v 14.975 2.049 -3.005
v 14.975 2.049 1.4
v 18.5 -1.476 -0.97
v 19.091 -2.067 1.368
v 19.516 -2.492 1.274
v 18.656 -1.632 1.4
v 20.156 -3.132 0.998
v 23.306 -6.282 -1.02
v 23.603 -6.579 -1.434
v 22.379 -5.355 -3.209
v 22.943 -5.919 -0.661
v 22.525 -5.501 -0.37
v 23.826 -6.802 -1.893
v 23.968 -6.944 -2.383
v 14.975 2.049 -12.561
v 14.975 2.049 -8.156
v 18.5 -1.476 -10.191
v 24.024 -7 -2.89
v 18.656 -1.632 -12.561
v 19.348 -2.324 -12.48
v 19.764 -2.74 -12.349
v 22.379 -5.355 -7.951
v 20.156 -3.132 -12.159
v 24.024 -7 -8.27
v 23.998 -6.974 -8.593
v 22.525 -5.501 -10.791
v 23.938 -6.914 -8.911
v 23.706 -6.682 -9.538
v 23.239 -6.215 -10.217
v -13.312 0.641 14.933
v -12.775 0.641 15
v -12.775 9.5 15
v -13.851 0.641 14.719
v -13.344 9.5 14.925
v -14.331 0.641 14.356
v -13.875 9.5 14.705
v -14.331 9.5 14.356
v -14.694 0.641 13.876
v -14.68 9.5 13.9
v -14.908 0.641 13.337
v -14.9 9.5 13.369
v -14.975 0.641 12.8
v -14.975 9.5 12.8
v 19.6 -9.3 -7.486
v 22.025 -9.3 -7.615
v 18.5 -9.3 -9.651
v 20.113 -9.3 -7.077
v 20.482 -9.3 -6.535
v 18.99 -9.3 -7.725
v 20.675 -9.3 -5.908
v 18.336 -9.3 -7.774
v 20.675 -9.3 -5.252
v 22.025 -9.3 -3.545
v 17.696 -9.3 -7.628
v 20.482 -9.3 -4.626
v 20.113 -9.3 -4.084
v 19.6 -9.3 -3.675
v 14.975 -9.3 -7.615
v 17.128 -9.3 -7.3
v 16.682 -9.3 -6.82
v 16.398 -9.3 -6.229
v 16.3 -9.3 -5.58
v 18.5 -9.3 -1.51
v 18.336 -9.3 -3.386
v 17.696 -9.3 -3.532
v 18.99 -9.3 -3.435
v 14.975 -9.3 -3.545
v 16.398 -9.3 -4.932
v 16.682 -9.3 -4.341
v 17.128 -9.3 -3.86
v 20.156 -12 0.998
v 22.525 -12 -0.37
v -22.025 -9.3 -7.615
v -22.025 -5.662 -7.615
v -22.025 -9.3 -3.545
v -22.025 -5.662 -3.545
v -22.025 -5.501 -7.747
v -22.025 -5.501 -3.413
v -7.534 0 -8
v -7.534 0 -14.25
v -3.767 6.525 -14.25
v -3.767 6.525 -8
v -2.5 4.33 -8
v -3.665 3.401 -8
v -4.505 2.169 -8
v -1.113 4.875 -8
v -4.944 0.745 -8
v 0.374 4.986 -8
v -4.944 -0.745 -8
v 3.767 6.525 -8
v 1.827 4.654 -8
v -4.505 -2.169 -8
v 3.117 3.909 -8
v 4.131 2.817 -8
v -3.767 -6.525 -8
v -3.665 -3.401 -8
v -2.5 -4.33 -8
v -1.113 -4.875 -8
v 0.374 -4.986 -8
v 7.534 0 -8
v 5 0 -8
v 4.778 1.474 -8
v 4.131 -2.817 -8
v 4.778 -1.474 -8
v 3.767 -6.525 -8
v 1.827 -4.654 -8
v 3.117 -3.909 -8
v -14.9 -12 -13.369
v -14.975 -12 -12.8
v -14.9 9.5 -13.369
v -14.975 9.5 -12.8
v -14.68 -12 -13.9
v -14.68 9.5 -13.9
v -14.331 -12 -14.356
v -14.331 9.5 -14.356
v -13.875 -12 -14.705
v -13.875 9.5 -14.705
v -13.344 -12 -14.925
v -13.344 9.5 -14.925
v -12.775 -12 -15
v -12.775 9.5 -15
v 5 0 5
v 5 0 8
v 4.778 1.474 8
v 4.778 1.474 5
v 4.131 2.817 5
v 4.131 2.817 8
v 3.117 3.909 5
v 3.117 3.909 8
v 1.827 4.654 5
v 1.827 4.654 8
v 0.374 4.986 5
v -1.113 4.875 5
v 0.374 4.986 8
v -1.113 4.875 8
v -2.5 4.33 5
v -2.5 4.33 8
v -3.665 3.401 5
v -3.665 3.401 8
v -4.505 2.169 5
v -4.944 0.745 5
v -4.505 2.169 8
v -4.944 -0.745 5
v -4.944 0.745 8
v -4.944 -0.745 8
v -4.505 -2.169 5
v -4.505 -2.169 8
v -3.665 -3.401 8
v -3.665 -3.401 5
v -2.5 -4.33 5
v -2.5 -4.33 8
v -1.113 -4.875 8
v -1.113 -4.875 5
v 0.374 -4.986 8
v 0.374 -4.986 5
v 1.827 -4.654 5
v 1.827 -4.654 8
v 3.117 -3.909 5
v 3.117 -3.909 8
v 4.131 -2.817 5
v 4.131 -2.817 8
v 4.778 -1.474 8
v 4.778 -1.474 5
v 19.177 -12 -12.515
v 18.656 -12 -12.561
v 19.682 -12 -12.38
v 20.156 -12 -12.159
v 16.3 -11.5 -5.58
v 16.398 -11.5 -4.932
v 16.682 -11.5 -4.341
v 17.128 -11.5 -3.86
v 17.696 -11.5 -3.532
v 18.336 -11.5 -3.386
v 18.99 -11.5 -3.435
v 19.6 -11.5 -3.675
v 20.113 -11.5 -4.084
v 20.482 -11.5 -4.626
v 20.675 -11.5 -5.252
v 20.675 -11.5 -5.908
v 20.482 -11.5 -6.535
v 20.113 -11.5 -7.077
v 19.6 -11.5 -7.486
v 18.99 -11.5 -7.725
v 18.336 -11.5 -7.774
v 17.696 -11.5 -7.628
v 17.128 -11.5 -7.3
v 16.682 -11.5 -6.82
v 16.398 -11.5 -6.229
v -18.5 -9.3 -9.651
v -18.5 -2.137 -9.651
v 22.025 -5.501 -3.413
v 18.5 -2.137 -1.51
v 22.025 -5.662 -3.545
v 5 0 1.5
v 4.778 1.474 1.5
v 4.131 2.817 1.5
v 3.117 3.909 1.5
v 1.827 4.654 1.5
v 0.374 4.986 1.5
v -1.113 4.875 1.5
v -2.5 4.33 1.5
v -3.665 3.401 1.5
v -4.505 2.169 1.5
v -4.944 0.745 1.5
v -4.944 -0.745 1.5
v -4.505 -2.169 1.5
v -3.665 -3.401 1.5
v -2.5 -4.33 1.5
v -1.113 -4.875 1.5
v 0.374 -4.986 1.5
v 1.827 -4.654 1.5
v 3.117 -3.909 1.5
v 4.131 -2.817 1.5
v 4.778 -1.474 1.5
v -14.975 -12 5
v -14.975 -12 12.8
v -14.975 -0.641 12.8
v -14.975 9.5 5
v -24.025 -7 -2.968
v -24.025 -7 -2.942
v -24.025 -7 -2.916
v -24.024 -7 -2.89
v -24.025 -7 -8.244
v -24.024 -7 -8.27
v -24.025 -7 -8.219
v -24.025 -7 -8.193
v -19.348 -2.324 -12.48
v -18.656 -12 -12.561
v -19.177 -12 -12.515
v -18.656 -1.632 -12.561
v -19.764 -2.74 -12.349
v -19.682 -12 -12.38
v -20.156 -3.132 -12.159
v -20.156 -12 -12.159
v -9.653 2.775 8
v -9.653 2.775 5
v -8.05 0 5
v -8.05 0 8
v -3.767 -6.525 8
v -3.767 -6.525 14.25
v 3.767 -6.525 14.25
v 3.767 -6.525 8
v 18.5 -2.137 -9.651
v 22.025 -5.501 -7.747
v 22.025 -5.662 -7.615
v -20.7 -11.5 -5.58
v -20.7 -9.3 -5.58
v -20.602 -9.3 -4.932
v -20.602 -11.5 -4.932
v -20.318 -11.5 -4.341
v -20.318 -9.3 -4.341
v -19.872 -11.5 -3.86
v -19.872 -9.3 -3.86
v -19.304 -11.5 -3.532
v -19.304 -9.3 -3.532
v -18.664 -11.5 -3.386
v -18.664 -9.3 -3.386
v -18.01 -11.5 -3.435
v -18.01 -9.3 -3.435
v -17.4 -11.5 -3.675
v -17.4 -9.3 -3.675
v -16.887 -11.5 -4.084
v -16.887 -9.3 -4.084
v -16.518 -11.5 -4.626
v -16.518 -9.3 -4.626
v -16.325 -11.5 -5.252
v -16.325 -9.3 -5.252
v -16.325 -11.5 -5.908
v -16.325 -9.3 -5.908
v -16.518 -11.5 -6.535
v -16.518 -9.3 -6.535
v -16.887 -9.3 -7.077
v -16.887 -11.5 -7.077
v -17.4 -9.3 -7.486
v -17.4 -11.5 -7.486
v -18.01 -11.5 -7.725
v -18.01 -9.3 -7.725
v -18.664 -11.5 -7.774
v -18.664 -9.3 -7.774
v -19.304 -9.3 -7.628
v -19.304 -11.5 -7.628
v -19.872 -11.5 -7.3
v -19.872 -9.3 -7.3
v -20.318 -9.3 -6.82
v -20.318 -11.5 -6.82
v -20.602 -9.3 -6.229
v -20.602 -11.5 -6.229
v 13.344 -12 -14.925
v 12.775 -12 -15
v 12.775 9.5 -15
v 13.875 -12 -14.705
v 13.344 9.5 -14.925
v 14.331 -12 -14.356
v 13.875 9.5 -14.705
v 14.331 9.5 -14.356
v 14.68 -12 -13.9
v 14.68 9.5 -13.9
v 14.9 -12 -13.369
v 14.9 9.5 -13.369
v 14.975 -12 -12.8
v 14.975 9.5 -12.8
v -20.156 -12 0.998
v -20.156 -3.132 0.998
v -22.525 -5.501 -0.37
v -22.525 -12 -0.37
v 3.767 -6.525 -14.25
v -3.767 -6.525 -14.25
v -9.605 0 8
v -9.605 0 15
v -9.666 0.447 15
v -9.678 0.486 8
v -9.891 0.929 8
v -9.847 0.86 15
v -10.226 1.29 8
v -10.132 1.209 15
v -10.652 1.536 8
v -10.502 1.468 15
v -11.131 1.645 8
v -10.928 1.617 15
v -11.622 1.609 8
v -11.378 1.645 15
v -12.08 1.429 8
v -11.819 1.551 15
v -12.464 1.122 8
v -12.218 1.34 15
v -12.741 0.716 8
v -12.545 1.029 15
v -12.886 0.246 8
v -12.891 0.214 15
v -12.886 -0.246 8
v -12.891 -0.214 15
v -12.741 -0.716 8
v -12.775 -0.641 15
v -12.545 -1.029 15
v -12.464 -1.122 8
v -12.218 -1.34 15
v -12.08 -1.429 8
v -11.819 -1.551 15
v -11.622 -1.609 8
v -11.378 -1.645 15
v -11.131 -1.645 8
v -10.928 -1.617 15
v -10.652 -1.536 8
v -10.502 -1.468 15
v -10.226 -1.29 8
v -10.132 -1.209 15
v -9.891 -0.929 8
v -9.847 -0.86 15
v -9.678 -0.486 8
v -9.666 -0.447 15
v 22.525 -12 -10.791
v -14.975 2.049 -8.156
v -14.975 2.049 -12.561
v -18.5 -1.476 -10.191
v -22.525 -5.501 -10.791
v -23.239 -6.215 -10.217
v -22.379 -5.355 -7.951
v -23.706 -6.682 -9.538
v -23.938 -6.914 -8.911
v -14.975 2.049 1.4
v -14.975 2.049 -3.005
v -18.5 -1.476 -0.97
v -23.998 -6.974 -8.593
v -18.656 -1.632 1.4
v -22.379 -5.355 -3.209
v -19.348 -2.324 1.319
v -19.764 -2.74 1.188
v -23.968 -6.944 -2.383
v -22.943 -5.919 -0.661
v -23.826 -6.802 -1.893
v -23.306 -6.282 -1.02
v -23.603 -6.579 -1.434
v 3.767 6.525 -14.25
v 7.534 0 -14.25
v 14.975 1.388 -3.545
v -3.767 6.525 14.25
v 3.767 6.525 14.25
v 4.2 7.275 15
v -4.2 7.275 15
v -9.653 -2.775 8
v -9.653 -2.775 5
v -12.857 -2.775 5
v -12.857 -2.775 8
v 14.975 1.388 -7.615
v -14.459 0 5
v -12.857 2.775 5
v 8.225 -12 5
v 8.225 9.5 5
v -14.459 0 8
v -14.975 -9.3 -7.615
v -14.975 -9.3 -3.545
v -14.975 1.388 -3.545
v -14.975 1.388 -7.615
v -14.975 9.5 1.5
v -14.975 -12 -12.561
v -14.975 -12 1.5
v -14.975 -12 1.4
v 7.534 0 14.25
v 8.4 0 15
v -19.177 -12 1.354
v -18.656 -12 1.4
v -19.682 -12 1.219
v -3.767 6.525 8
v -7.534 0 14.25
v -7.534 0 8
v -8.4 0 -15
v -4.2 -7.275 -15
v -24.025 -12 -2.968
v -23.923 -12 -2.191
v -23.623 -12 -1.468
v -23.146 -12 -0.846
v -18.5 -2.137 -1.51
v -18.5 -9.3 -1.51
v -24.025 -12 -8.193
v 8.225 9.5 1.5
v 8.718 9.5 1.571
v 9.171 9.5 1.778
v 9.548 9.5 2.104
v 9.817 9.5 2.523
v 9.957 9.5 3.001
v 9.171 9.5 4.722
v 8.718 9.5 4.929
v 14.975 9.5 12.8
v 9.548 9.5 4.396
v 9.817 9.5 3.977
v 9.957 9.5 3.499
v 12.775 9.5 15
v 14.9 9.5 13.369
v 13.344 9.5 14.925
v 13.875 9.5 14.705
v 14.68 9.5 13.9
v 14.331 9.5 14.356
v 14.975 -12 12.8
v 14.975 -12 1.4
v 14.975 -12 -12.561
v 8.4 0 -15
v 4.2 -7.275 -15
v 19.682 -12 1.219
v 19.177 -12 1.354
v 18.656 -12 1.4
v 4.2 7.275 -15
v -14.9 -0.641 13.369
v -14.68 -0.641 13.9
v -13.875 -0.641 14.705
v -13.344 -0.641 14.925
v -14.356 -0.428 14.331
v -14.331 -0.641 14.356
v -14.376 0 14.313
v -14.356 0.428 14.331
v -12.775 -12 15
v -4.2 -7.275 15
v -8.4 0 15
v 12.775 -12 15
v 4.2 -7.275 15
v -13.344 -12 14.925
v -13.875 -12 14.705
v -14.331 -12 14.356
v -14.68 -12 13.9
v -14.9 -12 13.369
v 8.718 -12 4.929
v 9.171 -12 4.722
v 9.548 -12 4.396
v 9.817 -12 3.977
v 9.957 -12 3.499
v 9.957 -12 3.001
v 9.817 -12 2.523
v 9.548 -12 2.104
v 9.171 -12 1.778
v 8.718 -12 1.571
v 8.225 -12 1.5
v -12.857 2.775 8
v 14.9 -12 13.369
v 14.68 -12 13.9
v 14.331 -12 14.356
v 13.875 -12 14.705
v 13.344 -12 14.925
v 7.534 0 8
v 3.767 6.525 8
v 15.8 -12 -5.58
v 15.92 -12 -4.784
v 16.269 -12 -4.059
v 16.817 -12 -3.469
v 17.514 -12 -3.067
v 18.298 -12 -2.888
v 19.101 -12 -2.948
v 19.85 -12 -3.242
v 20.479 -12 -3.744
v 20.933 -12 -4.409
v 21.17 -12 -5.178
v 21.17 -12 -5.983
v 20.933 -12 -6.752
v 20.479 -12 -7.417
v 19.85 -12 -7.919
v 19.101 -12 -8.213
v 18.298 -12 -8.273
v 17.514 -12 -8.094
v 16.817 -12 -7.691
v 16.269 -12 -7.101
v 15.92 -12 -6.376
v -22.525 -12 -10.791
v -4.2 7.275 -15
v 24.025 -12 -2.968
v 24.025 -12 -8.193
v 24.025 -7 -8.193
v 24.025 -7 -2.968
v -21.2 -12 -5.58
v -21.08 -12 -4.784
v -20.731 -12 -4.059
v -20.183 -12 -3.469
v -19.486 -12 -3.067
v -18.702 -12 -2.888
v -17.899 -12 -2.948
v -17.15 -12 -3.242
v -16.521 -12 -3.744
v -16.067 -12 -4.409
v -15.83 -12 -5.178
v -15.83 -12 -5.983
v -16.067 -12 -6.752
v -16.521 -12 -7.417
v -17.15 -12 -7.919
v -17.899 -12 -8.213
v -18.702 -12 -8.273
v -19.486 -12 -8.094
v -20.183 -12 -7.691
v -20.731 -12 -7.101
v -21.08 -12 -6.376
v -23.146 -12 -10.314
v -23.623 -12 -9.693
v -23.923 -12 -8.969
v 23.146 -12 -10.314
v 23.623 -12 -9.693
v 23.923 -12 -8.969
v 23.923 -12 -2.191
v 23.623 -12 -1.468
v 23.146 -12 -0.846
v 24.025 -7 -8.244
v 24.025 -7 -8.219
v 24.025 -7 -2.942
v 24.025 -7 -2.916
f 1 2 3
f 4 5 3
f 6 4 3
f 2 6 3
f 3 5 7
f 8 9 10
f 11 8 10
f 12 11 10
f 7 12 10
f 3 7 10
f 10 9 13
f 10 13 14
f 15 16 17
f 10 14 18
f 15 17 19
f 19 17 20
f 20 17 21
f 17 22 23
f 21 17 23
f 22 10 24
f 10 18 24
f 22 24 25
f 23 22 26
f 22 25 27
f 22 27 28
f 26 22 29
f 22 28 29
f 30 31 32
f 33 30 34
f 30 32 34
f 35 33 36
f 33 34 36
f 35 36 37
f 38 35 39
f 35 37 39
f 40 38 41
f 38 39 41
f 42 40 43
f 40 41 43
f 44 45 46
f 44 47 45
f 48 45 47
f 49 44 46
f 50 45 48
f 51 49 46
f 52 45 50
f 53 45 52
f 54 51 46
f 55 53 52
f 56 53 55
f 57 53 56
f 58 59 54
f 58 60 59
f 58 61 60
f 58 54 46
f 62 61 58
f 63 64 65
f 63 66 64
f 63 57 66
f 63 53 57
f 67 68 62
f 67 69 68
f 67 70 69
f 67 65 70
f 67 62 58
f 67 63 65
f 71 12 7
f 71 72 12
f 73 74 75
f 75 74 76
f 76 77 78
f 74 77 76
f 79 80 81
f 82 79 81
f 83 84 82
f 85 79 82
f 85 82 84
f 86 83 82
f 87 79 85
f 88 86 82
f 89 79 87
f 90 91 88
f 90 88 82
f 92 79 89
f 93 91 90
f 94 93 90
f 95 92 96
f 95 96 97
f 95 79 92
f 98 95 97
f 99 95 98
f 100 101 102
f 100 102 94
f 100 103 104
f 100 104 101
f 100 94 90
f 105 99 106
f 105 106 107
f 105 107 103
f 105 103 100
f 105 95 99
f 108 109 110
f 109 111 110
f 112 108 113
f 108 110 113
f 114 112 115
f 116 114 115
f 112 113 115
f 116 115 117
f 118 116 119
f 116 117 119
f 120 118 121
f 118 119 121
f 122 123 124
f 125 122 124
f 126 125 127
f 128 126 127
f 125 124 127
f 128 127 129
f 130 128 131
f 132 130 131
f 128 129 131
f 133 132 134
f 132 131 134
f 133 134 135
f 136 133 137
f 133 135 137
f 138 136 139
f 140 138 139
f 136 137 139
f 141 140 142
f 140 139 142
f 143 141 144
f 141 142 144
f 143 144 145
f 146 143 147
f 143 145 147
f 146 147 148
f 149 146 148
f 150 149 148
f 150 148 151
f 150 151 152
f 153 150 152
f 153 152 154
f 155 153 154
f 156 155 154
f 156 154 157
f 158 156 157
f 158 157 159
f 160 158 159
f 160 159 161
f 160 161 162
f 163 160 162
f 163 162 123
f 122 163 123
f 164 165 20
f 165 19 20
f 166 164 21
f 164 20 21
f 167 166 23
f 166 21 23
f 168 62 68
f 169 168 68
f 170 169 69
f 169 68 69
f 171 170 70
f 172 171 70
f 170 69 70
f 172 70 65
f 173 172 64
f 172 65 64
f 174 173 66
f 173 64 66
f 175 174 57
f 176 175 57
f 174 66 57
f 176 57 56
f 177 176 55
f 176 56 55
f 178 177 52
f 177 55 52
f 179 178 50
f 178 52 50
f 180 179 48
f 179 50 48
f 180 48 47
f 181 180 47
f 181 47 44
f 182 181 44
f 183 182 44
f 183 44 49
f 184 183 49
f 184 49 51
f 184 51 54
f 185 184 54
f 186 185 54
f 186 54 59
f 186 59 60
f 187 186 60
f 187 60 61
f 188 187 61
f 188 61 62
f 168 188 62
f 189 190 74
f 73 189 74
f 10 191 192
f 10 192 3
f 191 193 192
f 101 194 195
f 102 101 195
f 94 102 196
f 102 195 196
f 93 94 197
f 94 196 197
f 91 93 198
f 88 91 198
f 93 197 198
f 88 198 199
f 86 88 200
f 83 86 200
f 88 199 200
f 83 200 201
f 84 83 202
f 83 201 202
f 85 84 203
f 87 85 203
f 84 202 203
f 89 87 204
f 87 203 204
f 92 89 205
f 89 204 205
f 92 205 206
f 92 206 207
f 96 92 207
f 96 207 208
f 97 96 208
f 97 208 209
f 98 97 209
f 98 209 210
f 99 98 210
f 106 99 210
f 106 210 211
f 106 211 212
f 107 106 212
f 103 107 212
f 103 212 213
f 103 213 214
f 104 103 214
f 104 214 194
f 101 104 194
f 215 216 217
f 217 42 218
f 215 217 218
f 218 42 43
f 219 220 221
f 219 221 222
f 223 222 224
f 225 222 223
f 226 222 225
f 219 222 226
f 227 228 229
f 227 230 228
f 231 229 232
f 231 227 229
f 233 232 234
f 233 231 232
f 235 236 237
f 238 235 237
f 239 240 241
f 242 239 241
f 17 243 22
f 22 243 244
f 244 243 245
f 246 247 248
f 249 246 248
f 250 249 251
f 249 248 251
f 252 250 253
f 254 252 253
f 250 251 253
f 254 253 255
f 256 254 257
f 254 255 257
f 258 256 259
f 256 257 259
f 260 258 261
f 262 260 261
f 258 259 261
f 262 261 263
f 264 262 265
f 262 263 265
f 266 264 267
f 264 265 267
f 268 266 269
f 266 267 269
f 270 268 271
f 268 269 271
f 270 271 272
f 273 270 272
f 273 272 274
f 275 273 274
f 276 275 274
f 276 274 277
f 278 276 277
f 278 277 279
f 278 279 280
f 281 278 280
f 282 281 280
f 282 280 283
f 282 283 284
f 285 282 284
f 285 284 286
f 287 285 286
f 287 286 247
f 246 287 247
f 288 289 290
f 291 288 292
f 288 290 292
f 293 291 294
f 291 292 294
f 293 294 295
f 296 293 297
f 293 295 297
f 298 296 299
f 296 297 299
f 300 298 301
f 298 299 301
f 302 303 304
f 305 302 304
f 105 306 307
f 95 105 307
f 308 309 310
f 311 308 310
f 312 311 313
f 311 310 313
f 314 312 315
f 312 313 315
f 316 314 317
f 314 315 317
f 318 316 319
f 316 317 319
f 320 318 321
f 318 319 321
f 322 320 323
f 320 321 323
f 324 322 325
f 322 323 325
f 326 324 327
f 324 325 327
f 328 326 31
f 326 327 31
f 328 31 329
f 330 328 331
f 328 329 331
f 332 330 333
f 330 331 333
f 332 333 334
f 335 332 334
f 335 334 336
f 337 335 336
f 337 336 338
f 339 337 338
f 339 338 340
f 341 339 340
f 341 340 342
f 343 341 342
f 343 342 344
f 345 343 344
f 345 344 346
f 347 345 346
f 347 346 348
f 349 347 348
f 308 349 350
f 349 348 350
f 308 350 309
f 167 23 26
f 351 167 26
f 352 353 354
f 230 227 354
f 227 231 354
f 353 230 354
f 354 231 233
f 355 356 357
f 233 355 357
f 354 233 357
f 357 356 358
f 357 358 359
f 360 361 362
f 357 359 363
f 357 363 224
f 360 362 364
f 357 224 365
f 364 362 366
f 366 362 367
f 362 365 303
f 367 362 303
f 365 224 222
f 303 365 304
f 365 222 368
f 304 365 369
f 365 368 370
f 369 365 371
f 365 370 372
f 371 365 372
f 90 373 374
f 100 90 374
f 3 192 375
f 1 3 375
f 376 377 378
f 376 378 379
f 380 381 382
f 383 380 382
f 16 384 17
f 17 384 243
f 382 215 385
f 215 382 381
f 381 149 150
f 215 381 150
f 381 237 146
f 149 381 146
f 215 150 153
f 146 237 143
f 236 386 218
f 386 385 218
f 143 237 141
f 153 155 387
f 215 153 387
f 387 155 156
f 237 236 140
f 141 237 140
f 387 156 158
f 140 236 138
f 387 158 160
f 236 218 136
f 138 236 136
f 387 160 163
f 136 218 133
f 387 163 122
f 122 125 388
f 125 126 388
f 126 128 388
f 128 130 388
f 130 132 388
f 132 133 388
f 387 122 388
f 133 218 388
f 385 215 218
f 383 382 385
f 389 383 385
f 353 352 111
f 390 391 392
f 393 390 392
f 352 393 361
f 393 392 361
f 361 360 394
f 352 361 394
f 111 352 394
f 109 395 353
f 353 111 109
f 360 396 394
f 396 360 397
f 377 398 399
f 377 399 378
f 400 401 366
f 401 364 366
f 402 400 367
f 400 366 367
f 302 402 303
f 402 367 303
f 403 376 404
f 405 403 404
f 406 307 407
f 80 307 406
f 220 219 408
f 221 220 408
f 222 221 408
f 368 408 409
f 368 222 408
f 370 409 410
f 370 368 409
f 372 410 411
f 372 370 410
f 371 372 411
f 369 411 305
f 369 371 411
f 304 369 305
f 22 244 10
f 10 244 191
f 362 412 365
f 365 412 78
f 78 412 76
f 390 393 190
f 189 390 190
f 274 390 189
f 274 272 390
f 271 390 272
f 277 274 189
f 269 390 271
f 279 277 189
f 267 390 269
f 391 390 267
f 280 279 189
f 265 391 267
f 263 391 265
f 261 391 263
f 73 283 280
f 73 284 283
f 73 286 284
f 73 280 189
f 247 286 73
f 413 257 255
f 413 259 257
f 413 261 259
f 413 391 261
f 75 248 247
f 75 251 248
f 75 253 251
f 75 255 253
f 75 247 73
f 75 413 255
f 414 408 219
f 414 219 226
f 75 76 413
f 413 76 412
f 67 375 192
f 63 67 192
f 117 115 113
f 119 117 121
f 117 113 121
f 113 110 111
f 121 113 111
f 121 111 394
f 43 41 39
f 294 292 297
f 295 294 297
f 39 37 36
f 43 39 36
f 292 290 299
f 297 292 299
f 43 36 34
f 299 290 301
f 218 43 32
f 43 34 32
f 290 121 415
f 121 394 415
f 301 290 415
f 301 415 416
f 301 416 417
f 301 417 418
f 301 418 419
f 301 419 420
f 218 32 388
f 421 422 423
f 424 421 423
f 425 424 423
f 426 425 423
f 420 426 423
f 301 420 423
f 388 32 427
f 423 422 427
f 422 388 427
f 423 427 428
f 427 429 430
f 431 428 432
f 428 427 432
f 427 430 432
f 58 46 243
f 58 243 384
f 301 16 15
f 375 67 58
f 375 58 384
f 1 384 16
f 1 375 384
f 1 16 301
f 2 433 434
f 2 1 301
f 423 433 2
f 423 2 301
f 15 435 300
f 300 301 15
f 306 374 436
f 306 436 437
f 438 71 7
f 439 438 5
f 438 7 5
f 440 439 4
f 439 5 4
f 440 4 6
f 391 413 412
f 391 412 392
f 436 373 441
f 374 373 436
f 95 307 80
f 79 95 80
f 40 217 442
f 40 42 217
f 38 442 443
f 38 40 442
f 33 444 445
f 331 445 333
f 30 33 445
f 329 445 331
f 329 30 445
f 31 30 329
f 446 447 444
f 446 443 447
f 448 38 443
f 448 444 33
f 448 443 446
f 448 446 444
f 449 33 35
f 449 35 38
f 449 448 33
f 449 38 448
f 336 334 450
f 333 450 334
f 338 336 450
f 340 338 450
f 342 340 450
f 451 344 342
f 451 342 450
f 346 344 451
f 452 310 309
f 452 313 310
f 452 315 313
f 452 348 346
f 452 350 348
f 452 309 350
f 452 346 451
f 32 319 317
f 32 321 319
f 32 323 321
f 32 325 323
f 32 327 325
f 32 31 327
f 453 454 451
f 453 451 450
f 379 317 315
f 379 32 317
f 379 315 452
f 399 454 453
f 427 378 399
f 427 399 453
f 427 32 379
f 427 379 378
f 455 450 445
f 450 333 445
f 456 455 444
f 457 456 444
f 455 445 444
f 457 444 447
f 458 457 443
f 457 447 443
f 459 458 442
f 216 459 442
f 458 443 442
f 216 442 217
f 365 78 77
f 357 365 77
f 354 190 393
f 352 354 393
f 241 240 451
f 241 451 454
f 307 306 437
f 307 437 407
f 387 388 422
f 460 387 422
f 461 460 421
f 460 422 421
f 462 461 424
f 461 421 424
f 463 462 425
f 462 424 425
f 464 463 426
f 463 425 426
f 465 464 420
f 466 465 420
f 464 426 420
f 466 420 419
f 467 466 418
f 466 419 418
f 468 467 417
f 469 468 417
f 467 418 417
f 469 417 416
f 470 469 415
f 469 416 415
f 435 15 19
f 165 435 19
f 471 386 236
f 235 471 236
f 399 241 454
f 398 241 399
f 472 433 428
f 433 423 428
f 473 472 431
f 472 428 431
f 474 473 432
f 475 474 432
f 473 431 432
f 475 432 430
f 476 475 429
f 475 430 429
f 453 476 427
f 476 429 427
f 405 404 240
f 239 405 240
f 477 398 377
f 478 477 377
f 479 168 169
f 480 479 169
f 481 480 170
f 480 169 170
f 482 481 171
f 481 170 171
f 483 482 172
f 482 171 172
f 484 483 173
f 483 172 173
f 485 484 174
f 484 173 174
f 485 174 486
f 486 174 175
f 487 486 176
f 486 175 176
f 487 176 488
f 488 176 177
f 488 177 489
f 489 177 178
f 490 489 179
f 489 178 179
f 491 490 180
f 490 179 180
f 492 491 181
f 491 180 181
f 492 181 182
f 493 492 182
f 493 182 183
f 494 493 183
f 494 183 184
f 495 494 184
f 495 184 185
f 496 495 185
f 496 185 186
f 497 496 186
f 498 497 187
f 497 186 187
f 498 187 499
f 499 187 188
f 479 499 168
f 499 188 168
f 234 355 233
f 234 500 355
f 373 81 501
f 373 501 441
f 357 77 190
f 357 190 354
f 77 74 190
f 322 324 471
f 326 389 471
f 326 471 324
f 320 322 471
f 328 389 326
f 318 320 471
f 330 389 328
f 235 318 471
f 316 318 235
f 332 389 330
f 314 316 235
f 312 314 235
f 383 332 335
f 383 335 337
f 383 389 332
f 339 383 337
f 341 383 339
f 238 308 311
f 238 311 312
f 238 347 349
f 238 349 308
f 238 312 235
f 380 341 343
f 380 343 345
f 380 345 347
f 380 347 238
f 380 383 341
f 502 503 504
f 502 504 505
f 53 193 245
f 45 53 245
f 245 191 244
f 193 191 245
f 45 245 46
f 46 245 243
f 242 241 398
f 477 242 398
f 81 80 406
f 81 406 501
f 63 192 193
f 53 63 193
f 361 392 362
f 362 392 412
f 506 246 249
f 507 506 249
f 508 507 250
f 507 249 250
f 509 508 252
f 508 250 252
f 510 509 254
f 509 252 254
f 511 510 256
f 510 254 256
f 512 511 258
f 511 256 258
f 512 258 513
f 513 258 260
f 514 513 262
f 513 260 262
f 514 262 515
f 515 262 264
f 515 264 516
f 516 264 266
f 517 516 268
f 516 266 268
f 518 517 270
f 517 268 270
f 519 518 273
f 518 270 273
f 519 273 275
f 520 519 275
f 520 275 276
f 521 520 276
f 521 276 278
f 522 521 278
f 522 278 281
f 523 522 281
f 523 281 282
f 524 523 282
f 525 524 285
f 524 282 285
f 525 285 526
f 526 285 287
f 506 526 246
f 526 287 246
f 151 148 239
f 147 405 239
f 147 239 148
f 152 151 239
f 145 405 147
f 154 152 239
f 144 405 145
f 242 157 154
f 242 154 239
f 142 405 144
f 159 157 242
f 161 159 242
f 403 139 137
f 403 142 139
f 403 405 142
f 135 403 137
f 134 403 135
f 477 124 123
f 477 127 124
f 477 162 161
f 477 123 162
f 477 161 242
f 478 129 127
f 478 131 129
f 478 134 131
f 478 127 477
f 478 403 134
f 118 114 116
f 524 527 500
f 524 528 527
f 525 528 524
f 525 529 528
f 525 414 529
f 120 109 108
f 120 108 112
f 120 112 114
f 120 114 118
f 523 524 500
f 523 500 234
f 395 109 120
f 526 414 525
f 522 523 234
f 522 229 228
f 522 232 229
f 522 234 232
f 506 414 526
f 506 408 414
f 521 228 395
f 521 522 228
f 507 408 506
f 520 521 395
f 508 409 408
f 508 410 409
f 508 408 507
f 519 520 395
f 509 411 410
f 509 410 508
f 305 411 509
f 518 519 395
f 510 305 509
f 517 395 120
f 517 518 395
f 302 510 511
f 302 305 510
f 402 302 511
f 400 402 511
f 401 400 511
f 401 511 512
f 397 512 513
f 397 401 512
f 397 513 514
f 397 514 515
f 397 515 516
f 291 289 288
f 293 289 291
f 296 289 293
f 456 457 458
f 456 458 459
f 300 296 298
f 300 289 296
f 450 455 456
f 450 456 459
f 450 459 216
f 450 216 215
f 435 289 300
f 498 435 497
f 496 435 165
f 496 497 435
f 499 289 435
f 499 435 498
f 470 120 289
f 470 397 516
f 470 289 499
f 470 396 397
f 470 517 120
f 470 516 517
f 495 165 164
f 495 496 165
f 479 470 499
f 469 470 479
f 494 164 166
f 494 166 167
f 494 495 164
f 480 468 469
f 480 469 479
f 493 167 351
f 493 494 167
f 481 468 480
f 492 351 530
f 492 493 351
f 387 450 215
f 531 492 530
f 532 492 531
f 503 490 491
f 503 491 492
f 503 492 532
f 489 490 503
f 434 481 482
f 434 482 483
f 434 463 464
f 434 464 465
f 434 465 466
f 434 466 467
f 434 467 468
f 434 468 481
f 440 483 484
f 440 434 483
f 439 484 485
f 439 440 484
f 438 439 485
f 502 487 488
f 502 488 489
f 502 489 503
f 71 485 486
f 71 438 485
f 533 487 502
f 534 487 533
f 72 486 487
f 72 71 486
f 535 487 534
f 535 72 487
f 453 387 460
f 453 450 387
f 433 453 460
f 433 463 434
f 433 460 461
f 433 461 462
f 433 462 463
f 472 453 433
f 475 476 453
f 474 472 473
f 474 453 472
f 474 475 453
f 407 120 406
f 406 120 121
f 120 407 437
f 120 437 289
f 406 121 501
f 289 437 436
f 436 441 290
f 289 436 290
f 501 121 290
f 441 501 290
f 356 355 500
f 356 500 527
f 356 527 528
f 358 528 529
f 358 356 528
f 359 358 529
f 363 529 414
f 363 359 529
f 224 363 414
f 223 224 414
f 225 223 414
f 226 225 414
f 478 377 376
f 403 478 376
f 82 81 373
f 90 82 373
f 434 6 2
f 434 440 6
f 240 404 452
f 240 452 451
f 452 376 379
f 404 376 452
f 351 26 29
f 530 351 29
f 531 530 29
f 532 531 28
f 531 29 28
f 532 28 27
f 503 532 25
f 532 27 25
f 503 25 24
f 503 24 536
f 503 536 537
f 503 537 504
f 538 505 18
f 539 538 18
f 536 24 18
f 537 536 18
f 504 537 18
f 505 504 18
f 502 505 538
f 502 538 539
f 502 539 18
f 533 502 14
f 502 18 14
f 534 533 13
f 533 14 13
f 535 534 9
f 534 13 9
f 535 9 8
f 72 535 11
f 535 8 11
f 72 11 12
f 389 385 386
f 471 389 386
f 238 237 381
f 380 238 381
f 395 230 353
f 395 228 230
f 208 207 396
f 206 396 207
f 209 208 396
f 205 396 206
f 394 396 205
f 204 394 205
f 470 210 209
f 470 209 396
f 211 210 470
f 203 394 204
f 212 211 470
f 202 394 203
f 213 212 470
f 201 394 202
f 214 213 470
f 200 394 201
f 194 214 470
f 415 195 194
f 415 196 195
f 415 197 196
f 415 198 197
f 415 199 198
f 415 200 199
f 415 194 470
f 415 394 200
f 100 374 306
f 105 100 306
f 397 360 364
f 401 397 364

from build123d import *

# Parameters (mm, degrees)
SKETCH_W        = 29.95
SKETCH_H        = 21.5
PAD_DEPTH       = 15
POCKET_DEPTH    = 21.501
SKETCH002_R     = 5
POCKET001_DEPTH = 30.001
POCKET002_DEPTH = 7
POCKET003_DEPTH = 7
PAD001_DEPTH    = 5
CHAMFER_SIZE    = 9.049
POCKET004_DEPTH = 18.8
SKETCH007_R     = 2.2
POCKET005_DEPTH = 2.701
SKETCH008_R     = 1.65
POCKET006_DEPTH = 10
POCKET007_DEPTH = 3
FILLET_R        = 2.2
FILLET001_R     = 3
CHAMFER001_SIZE = 0.75
CHAMFER002_SIZE = 0.5
CHAMFER003_SIZE = 0.5


with BuildPart() as part:
    # Sketch → Pad (new body, symmetric)
    with BuildSketch(Plane.XY):
        with Locations((0, -1.25)):
            Rectangle(SKETCH_W, SKETCH_H)
    extrude(amount=PAD_DEPTH, both=True)

    # Sketch001 (on Face1 of Pad) → Pocket (cut, through all)
    with BuildSketch(Plane(origin=(0, 9.5, 0), x_dir=(-1, 0, 0), z_dir=(0, 1, 0))):
        with BuildLine():
            Line((14.975, 1.5), (14.975, 5))
            Line((14.975, 5), (-8.224983, 5))
            ThreePointArc((-8.224983, 5), (-9.975, 3.25), (-8.224983, 1.5))
            Line((14.975, 1.5), (-8.224983, 1.5))
        make_face()
    extrude(amount=-POCKET_DEPTH, mode=Mode.SUBTRACT)

    # Sketch002 (on Face4 of Pocket) → Pocket001 (cut, through all)
    with BuildSketch(Plane.XY.offset(15)):
        Circle(SKETCH002_R)
    extrude(amount=-POCKET001_DEPTH, mode=Mode.SUBTRACT)

    # Sketch003 (on Face4 of Pocket001) → Pocket002 (cut)
    with BuildSketch(Plane.XY.offset(15)):
        Polygon((7.534421, 0), (3.767211, 6.525), (-3.767211, 6.525), (-7.534421, 0), (-3.767211, -6.525), (3.767211, -6.525), align=None)
    extrude(amount=-POCKET002_DEPTH, mode=Mode.SUBTRACT)

    # Sketch004 (on Face2 of Pocket002) → Pocket003 (cut)
    with BuildSketch(Plane(origin=(0, 0, -15), x_dir=(1, 0, 0), z_dir=(0, 0, -1))):
        Polygon((7.534421, 0), (3.767211, 6.525), (-3.767211, 6.525), (-7.534421, 0), (-3.767211, -6.525), (3.767211, -6.525), align=None)
    extrude(amount=-POCKET003_DEPTH, mode=Mode.SUBTRACT)

    # Sketch005 (on Face10 of Pocket003) → Pad001 (new body)
    with BuildSketch(Plane.XZ.offset(12)):
        Polygon((-14.975, 1.4), (-19.459732, 1.4), (-24.025, -1.235759), (-24.025, -9.92488), (-19.459732, -12.560639), (-14.975, -12.560639), align=None)
        Polygon((14.975, 1.4), (14.975, -12.560639), (19.459732, -12.560639), (24.025, -9.92488), (24.025, -1.235759), (19.459732, 1.4), align=None)
    extrude(amount=-PAD001_DEPTH)

    # Chamfer
    chamfer_edges = [part.edges().sort_by_distance(p)[0] for p in [
        (-14.975, -7, -5.580319),
        (14.975, -7, -5.580319),
    ]]
    chamfer(chamfer_edges, length=CHAMFER_SIZE)

    # Sketch006 (on Face7 of Chamfer) → Pocket004 (cut)
    with BuildSketch(Plane(origin=(0, 9.5, 0), x_dir=(-1, 0, 0), z_dir=(0, 1, 0))):
        Polygon((22.025, -7.61548), (22.025, -3.54516), (18.5, -1.510001), (14.975, -3.54516), (14.975, -7.61548), (18.5, -9.650639), align=None)
        Polygon((-18.5, -9.650639), (-14.975, -7.61548), (-14.975, -3.54516), (-18.5, -1.510001), (-22.025, -3.54516), (-22.025, -7.61548), align=None)
    extrude(amount=-POCKET004_DEPTH, mode=Mode.SUBTRACT)

    # Sketch007 (on Face36 of Pocket004) → Pocket005 (cut, through all)
    with BuildSketch(Plane(origin=(0, -9.3, 0), x_dir=(-1, 0, 0), z_dir=(0, 1, 0))):
        with Locations((-18.5, -5.58032)):
            Circle(SKETCH007_R)
        with Locations((18.5, -5.58032)):
            Circle(SKETCH007_R)
    extrude(amount=-POCKET005_DEPTH, mode=Mode.SUBTRACT)

    # Sketch008 (on Face23 of Pocket005) → Pocket006 (cut)
    with BuildSketch(Plane.XY.offset(15)):
        with Locations((-11.254711, 0)):
            Circle(SKETCH008_R)
    extrude(amount=-POCKET006_DEPTH, mode=Mode.SUBTRACT)

    # Sketch009 (on Face26 of Pocket006) → Pocket007 (cut)
    with BuildSketch(Plane(origin=(0, 0, 5), x_dir=(1, 0, 0), z_dir=(0, 0, -1))):
        Polygon((-9.652564, -2.775), (-8.050417, 0), (-9.652564, 2.775), (-12.856858, 2.775), (-14.459005, 0), (-12.856858, -2.775), align=None)
    extrude(amount=-POCKET007_DEPTH, mode=Mode.SUBTRACT)

    # Fillet
    fillet_edges = [part.edges().sort_by_distance(p)[0] for p in [
        (-14.975, -1.25, -15),
        (14.975, -1.25, -15),
        (-14.975, -1.25, 15),
        (14.975, -1.25, 15),
    ]]
    fillet(fillet_edges, radius=FILLET_R)

    # Fillet001
    fillet001_edges = [part.edges().sort_by_distance(p)[0] for p in [
        (24.025, -9.5, -9.92488),
        (19.459732, -7.217866, -12.560639),
        (24.025, -9.5, -1.235759),
        (-19.459732, -7.217866, -12.560639),
        (-24.025, -9.5, -9.92488),
        (-24.025, -9.5, -1.235759),
        (-19.459732, -7.217866, 1.4),
        (19.459732, -7.217866, 1.4),
    ]]
    fillet(fillet001_edges, radius=FILLET001_R)

    # Chamfer001
    chamfer001_edges = [part.edges().sort_by_distance(p)[0] for p in [
        (-5.650816, -3.2625, -15),
        (0, -6.525, -15),
        (5.650816, -3.2625, -15),
        (5.650816, 3.2625, -15),
        (0, 6.525, -15),
        (-5.650816, 3.2625, -15),
        (-5.650816, 3.2625, 15),
        (0, 6.525, 15),
        (5.650816, 3.2625, 15),
        (5.650816, -3.2625, 15),
        (0, -6.525, 15),
        (-5.650816, -3.2625, 15),
    ]]
    chamfer(chamfer001_edges, length=CHAMFER001_SIZE)

    # Chamfer002
    chamfer002_edges = [part.edges().sort_by_distance(p)[0] for p in [
        (-16.7375, 0.2865, -8.63306),
        (-16.7375, 0.2865, -2.52758),
        (-20.2625, -3.2385, -2.52758),
        (-20.2625, -3.2385, -8.63306),
        (-22.025, -5.001, -5.58032),
        (16.7375, 0.2865, -2.52758),
        (16.7375, 0.2865, -8.63306),
        (20.2625, -3.2385, -8.63306),
        (22.025, -5.001, -5.58032),
        (20.2625, -3.2385, -2.52758),
    ]]
    chamfer(chamfer002_edges, length=CHAMFER002_SIZE)

    # Chamfer003
    chamfer003_edges = [part.edges().sort_by_distance(p)[0] for p in [
        (-16.3, -12, -5.58032),
        (20.7, -12, -5.58032),
    ]]
    chamfer(chamfer003_edges, length=CHAMFER003_SIZE)


solid = part.part
